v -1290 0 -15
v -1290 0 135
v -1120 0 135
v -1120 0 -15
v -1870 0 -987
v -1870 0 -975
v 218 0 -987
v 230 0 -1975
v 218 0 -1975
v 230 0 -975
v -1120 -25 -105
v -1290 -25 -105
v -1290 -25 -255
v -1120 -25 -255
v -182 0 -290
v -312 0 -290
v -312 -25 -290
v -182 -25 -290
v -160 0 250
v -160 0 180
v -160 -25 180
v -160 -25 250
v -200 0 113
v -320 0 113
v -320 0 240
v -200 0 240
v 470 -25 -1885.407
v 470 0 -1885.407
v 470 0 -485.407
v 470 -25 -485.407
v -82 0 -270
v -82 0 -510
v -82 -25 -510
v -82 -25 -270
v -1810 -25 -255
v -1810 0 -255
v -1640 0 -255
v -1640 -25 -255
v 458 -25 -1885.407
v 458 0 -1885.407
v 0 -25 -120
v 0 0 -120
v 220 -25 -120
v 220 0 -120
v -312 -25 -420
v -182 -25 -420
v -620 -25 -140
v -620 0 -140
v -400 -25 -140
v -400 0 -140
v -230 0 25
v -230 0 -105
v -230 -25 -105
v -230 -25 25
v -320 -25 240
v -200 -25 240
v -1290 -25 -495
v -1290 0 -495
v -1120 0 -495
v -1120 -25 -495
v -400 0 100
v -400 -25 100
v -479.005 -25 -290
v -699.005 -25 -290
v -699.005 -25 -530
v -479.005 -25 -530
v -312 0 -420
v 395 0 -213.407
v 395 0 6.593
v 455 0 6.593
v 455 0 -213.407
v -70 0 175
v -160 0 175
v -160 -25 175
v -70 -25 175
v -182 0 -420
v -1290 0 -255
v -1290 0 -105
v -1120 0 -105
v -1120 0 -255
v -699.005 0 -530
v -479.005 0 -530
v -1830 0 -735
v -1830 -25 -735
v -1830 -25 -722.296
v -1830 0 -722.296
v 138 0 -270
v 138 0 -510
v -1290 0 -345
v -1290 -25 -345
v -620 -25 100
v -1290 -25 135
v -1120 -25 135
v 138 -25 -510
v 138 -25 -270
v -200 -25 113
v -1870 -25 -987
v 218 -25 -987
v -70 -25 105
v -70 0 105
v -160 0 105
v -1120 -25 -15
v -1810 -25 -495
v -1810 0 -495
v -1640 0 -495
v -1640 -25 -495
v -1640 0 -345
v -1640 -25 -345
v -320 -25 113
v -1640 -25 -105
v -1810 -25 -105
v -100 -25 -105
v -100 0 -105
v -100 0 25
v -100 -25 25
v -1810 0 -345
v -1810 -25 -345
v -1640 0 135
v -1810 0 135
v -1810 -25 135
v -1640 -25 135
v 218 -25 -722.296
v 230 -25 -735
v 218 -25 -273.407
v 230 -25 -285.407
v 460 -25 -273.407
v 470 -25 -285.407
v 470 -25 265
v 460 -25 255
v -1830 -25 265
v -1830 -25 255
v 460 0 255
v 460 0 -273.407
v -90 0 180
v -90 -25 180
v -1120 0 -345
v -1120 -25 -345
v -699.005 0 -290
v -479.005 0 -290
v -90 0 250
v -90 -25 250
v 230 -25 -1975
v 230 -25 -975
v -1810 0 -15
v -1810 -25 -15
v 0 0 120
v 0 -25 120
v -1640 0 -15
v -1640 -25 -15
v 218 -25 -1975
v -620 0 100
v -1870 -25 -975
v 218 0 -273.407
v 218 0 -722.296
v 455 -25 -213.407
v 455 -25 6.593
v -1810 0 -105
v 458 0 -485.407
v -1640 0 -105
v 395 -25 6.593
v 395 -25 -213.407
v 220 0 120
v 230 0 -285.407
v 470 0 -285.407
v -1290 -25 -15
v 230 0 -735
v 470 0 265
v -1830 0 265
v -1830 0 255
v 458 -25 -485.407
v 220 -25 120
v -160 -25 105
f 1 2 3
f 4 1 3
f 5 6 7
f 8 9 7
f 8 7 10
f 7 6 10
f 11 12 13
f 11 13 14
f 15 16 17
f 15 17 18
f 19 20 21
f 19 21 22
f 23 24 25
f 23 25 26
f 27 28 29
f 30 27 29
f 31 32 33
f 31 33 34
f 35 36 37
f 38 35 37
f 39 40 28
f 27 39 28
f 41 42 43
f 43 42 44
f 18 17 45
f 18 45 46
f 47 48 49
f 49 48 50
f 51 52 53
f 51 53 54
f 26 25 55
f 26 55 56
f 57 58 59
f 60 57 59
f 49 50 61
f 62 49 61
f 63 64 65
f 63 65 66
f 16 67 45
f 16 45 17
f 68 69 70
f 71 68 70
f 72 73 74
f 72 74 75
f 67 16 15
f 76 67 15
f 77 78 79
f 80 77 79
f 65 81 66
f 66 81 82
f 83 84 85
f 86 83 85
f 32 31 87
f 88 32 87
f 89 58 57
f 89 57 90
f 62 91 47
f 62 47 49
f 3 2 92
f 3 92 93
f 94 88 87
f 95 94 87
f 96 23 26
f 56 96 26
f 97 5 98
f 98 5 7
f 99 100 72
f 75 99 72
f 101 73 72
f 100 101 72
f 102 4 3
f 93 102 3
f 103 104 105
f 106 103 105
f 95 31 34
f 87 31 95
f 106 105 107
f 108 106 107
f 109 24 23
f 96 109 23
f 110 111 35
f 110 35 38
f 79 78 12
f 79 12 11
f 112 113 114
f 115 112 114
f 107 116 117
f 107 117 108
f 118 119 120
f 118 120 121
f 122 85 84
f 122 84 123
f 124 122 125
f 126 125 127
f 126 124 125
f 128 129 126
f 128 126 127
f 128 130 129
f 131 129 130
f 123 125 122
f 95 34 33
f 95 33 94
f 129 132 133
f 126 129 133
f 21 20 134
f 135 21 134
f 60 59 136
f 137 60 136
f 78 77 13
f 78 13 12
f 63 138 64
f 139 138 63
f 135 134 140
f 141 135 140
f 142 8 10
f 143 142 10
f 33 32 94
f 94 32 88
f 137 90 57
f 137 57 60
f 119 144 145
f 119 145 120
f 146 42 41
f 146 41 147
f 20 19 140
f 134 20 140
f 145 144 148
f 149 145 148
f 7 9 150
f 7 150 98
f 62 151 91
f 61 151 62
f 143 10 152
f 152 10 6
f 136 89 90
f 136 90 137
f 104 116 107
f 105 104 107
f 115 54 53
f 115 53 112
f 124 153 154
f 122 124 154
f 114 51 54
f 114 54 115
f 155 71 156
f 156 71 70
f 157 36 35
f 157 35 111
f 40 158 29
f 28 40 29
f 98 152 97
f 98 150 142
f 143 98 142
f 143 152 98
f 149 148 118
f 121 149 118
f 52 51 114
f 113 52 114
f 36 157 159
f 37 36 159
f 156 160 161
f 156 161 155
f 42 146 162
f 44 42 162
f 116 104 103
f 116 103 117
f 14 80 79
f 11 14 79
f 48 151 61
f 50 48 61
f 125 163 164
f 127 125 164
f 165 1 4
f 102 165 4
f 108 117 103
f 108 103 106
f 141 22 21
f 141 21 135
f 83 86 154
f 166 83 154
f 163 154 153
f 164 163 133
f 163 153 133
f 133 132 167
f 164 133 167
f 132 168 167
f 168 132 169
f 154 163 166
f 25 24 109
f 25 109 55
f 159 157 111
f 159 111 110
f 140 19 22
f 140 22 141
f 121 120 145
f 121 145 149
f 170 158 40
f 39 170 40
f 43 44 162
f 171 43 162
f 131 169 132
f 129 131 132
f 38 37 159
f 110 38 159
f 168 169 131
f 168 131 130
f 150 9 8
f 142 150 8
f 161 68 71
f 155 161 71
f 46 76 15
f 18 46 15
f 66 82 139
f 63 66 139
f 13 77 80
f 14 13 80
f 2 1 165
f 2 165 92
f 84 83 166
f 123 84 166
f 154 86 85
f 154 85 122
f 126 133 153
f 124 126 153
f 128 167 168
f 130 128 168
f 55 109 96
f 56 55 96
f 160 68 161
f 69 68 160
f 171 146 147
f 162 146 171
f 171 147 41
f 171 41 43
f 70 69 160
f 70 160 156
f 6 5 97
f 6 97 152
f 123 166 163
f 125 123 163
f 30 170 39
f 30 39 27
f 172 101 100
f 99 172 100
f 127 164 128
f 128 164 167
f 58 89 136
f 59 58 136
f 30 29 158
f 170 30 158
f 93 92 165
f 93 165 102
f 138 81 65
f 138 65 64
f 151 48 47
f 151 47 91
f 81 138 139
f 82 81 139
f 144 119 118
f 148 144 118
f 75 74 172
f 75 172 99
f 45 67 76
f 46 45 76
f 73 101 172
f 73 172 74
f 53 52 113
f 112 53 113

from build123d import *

# Parameters (mm, degrees)
F0_W     = 220
F0_H     = 240
F0_W_2   = 10
F0_H_2   = 528.406718
F0_H_3   = 10
F0_W_3   = 2290
F0_H_4   = 12
F0_W_4   = 230
F0_W_5   = 12
F0_H_5   = 436.889386
F0_H_6   = 12.703896
F0_W_6   = 2048
F0_W_7   = 130
F0_H_7   = 130
F0_W_8   = 120
F0_H_8   = 127
F0_W_9   = 90
F0_H_9   = 70
F0_W_10  = 70
F0_W_11  = 60
F0_H_10  = 220
F0_W_12  = 170
F0_H_11  = 150
F0_W_13  = 2088
F0_H_12  = 988
F1_DEPTH = 25


with BuildPart() as f1:
    # F0 (on Front) → F1 (new body)
    with BuildSketch(Plane.XZ):
        with Locations((110, 0)):
            Rectangle(F0_W, F0_H)
        with Locations((465, -9.203359)):
            Rectangle(F0_W_2, F0_H_2)
        with Locations((465, 260)):
            Rectangle(F0_W_2, F0_H_3)
        Polygon((470, -635), (470, -485.406718), (458, -485.406718), (458, -1885.406718), (470, -1885.406718), (470, -735), (470, -722.296104), align=None)
        with Locations((-685, 260)):
            Rectangle(F0_W_3, F0_H_3)
        with Locations((465, -279.406718)):
            Rectangle(F0_W_2, F0_H_4)
        with Locations((345, -279.406718)):
            Rectangle(F0_W_4, F0_H_4)
        with Locations((224, -279.406718)):
            Rectangle(F0_W_5, F0_H_4)
        with Locations((224, -503.851411)):
            Rectangle(F0_W_5, F0_H_5)
        with Locations((224, -728.648052)):
            Rectangle(F0_W_5, F0_H_6)
        with Locations((-806, -728.648052)):
            Rectangle(F0_W_6, F0_H_6)
        with Locations((-165, -40)):
            Rectangle(F0_W_7, F0_H_7)
        with Locations((-260, 176.5)):
            Rectangle(F0_W_8, F0_H_8)
        with Locations((-115, 140)):
            Rectangle(F0_W_9, F0_H_9)
        with Locations((-125, 215)):
            Rectangle(F0_W_10, F0_H_9)
        with Locations((425, -103.406718)):
            Rectangle(F0_W_11, F0_H_10)
        with Locations((-510, -20)):
            Rectangle(F0_W, F0_H)
        with Locations((-1205, 60)):
            Rectangle(F0_W_12, F0_H_11)
        with Locations((-1205, -180)):
            Rectangle(F0_W_12, F0_H_11)
        with Locations((224, -981)):
            Rectangle(F0_W_5, F0_H_4)
        with Locations((-826, -981)):
            Rectangle(F0_W_13, F0_H_4)
        with Locations((224, -1481)):
            Rectangle(F0_W_5, F0_H_12)
        with Locations((-1725, 60)):
            Rectangle(F0_W_12, F0_H_11)
        with Locations((-1725, -180)):
            Rectangle(F0_W_12, F0_H_11)
        with Locations((28, -390)):
            Rectangle(F0_W, F0_H)
        with Locations((-247, -355)):
            Rectangle(F0_W_7, F0_H_7)
        with Locations((-589.005002, -410)):
            Rectangle(F0_W, F0_H)
        with Locations((-1205, -420)):
            Rectangle(F0_W_12, F0_H_11)
        with Locations((-1725, -420)):
            Rectangle(F0_W_12, F0_H_11)
    extrude(amount=F1_DEPTH)


solid = f1.part
